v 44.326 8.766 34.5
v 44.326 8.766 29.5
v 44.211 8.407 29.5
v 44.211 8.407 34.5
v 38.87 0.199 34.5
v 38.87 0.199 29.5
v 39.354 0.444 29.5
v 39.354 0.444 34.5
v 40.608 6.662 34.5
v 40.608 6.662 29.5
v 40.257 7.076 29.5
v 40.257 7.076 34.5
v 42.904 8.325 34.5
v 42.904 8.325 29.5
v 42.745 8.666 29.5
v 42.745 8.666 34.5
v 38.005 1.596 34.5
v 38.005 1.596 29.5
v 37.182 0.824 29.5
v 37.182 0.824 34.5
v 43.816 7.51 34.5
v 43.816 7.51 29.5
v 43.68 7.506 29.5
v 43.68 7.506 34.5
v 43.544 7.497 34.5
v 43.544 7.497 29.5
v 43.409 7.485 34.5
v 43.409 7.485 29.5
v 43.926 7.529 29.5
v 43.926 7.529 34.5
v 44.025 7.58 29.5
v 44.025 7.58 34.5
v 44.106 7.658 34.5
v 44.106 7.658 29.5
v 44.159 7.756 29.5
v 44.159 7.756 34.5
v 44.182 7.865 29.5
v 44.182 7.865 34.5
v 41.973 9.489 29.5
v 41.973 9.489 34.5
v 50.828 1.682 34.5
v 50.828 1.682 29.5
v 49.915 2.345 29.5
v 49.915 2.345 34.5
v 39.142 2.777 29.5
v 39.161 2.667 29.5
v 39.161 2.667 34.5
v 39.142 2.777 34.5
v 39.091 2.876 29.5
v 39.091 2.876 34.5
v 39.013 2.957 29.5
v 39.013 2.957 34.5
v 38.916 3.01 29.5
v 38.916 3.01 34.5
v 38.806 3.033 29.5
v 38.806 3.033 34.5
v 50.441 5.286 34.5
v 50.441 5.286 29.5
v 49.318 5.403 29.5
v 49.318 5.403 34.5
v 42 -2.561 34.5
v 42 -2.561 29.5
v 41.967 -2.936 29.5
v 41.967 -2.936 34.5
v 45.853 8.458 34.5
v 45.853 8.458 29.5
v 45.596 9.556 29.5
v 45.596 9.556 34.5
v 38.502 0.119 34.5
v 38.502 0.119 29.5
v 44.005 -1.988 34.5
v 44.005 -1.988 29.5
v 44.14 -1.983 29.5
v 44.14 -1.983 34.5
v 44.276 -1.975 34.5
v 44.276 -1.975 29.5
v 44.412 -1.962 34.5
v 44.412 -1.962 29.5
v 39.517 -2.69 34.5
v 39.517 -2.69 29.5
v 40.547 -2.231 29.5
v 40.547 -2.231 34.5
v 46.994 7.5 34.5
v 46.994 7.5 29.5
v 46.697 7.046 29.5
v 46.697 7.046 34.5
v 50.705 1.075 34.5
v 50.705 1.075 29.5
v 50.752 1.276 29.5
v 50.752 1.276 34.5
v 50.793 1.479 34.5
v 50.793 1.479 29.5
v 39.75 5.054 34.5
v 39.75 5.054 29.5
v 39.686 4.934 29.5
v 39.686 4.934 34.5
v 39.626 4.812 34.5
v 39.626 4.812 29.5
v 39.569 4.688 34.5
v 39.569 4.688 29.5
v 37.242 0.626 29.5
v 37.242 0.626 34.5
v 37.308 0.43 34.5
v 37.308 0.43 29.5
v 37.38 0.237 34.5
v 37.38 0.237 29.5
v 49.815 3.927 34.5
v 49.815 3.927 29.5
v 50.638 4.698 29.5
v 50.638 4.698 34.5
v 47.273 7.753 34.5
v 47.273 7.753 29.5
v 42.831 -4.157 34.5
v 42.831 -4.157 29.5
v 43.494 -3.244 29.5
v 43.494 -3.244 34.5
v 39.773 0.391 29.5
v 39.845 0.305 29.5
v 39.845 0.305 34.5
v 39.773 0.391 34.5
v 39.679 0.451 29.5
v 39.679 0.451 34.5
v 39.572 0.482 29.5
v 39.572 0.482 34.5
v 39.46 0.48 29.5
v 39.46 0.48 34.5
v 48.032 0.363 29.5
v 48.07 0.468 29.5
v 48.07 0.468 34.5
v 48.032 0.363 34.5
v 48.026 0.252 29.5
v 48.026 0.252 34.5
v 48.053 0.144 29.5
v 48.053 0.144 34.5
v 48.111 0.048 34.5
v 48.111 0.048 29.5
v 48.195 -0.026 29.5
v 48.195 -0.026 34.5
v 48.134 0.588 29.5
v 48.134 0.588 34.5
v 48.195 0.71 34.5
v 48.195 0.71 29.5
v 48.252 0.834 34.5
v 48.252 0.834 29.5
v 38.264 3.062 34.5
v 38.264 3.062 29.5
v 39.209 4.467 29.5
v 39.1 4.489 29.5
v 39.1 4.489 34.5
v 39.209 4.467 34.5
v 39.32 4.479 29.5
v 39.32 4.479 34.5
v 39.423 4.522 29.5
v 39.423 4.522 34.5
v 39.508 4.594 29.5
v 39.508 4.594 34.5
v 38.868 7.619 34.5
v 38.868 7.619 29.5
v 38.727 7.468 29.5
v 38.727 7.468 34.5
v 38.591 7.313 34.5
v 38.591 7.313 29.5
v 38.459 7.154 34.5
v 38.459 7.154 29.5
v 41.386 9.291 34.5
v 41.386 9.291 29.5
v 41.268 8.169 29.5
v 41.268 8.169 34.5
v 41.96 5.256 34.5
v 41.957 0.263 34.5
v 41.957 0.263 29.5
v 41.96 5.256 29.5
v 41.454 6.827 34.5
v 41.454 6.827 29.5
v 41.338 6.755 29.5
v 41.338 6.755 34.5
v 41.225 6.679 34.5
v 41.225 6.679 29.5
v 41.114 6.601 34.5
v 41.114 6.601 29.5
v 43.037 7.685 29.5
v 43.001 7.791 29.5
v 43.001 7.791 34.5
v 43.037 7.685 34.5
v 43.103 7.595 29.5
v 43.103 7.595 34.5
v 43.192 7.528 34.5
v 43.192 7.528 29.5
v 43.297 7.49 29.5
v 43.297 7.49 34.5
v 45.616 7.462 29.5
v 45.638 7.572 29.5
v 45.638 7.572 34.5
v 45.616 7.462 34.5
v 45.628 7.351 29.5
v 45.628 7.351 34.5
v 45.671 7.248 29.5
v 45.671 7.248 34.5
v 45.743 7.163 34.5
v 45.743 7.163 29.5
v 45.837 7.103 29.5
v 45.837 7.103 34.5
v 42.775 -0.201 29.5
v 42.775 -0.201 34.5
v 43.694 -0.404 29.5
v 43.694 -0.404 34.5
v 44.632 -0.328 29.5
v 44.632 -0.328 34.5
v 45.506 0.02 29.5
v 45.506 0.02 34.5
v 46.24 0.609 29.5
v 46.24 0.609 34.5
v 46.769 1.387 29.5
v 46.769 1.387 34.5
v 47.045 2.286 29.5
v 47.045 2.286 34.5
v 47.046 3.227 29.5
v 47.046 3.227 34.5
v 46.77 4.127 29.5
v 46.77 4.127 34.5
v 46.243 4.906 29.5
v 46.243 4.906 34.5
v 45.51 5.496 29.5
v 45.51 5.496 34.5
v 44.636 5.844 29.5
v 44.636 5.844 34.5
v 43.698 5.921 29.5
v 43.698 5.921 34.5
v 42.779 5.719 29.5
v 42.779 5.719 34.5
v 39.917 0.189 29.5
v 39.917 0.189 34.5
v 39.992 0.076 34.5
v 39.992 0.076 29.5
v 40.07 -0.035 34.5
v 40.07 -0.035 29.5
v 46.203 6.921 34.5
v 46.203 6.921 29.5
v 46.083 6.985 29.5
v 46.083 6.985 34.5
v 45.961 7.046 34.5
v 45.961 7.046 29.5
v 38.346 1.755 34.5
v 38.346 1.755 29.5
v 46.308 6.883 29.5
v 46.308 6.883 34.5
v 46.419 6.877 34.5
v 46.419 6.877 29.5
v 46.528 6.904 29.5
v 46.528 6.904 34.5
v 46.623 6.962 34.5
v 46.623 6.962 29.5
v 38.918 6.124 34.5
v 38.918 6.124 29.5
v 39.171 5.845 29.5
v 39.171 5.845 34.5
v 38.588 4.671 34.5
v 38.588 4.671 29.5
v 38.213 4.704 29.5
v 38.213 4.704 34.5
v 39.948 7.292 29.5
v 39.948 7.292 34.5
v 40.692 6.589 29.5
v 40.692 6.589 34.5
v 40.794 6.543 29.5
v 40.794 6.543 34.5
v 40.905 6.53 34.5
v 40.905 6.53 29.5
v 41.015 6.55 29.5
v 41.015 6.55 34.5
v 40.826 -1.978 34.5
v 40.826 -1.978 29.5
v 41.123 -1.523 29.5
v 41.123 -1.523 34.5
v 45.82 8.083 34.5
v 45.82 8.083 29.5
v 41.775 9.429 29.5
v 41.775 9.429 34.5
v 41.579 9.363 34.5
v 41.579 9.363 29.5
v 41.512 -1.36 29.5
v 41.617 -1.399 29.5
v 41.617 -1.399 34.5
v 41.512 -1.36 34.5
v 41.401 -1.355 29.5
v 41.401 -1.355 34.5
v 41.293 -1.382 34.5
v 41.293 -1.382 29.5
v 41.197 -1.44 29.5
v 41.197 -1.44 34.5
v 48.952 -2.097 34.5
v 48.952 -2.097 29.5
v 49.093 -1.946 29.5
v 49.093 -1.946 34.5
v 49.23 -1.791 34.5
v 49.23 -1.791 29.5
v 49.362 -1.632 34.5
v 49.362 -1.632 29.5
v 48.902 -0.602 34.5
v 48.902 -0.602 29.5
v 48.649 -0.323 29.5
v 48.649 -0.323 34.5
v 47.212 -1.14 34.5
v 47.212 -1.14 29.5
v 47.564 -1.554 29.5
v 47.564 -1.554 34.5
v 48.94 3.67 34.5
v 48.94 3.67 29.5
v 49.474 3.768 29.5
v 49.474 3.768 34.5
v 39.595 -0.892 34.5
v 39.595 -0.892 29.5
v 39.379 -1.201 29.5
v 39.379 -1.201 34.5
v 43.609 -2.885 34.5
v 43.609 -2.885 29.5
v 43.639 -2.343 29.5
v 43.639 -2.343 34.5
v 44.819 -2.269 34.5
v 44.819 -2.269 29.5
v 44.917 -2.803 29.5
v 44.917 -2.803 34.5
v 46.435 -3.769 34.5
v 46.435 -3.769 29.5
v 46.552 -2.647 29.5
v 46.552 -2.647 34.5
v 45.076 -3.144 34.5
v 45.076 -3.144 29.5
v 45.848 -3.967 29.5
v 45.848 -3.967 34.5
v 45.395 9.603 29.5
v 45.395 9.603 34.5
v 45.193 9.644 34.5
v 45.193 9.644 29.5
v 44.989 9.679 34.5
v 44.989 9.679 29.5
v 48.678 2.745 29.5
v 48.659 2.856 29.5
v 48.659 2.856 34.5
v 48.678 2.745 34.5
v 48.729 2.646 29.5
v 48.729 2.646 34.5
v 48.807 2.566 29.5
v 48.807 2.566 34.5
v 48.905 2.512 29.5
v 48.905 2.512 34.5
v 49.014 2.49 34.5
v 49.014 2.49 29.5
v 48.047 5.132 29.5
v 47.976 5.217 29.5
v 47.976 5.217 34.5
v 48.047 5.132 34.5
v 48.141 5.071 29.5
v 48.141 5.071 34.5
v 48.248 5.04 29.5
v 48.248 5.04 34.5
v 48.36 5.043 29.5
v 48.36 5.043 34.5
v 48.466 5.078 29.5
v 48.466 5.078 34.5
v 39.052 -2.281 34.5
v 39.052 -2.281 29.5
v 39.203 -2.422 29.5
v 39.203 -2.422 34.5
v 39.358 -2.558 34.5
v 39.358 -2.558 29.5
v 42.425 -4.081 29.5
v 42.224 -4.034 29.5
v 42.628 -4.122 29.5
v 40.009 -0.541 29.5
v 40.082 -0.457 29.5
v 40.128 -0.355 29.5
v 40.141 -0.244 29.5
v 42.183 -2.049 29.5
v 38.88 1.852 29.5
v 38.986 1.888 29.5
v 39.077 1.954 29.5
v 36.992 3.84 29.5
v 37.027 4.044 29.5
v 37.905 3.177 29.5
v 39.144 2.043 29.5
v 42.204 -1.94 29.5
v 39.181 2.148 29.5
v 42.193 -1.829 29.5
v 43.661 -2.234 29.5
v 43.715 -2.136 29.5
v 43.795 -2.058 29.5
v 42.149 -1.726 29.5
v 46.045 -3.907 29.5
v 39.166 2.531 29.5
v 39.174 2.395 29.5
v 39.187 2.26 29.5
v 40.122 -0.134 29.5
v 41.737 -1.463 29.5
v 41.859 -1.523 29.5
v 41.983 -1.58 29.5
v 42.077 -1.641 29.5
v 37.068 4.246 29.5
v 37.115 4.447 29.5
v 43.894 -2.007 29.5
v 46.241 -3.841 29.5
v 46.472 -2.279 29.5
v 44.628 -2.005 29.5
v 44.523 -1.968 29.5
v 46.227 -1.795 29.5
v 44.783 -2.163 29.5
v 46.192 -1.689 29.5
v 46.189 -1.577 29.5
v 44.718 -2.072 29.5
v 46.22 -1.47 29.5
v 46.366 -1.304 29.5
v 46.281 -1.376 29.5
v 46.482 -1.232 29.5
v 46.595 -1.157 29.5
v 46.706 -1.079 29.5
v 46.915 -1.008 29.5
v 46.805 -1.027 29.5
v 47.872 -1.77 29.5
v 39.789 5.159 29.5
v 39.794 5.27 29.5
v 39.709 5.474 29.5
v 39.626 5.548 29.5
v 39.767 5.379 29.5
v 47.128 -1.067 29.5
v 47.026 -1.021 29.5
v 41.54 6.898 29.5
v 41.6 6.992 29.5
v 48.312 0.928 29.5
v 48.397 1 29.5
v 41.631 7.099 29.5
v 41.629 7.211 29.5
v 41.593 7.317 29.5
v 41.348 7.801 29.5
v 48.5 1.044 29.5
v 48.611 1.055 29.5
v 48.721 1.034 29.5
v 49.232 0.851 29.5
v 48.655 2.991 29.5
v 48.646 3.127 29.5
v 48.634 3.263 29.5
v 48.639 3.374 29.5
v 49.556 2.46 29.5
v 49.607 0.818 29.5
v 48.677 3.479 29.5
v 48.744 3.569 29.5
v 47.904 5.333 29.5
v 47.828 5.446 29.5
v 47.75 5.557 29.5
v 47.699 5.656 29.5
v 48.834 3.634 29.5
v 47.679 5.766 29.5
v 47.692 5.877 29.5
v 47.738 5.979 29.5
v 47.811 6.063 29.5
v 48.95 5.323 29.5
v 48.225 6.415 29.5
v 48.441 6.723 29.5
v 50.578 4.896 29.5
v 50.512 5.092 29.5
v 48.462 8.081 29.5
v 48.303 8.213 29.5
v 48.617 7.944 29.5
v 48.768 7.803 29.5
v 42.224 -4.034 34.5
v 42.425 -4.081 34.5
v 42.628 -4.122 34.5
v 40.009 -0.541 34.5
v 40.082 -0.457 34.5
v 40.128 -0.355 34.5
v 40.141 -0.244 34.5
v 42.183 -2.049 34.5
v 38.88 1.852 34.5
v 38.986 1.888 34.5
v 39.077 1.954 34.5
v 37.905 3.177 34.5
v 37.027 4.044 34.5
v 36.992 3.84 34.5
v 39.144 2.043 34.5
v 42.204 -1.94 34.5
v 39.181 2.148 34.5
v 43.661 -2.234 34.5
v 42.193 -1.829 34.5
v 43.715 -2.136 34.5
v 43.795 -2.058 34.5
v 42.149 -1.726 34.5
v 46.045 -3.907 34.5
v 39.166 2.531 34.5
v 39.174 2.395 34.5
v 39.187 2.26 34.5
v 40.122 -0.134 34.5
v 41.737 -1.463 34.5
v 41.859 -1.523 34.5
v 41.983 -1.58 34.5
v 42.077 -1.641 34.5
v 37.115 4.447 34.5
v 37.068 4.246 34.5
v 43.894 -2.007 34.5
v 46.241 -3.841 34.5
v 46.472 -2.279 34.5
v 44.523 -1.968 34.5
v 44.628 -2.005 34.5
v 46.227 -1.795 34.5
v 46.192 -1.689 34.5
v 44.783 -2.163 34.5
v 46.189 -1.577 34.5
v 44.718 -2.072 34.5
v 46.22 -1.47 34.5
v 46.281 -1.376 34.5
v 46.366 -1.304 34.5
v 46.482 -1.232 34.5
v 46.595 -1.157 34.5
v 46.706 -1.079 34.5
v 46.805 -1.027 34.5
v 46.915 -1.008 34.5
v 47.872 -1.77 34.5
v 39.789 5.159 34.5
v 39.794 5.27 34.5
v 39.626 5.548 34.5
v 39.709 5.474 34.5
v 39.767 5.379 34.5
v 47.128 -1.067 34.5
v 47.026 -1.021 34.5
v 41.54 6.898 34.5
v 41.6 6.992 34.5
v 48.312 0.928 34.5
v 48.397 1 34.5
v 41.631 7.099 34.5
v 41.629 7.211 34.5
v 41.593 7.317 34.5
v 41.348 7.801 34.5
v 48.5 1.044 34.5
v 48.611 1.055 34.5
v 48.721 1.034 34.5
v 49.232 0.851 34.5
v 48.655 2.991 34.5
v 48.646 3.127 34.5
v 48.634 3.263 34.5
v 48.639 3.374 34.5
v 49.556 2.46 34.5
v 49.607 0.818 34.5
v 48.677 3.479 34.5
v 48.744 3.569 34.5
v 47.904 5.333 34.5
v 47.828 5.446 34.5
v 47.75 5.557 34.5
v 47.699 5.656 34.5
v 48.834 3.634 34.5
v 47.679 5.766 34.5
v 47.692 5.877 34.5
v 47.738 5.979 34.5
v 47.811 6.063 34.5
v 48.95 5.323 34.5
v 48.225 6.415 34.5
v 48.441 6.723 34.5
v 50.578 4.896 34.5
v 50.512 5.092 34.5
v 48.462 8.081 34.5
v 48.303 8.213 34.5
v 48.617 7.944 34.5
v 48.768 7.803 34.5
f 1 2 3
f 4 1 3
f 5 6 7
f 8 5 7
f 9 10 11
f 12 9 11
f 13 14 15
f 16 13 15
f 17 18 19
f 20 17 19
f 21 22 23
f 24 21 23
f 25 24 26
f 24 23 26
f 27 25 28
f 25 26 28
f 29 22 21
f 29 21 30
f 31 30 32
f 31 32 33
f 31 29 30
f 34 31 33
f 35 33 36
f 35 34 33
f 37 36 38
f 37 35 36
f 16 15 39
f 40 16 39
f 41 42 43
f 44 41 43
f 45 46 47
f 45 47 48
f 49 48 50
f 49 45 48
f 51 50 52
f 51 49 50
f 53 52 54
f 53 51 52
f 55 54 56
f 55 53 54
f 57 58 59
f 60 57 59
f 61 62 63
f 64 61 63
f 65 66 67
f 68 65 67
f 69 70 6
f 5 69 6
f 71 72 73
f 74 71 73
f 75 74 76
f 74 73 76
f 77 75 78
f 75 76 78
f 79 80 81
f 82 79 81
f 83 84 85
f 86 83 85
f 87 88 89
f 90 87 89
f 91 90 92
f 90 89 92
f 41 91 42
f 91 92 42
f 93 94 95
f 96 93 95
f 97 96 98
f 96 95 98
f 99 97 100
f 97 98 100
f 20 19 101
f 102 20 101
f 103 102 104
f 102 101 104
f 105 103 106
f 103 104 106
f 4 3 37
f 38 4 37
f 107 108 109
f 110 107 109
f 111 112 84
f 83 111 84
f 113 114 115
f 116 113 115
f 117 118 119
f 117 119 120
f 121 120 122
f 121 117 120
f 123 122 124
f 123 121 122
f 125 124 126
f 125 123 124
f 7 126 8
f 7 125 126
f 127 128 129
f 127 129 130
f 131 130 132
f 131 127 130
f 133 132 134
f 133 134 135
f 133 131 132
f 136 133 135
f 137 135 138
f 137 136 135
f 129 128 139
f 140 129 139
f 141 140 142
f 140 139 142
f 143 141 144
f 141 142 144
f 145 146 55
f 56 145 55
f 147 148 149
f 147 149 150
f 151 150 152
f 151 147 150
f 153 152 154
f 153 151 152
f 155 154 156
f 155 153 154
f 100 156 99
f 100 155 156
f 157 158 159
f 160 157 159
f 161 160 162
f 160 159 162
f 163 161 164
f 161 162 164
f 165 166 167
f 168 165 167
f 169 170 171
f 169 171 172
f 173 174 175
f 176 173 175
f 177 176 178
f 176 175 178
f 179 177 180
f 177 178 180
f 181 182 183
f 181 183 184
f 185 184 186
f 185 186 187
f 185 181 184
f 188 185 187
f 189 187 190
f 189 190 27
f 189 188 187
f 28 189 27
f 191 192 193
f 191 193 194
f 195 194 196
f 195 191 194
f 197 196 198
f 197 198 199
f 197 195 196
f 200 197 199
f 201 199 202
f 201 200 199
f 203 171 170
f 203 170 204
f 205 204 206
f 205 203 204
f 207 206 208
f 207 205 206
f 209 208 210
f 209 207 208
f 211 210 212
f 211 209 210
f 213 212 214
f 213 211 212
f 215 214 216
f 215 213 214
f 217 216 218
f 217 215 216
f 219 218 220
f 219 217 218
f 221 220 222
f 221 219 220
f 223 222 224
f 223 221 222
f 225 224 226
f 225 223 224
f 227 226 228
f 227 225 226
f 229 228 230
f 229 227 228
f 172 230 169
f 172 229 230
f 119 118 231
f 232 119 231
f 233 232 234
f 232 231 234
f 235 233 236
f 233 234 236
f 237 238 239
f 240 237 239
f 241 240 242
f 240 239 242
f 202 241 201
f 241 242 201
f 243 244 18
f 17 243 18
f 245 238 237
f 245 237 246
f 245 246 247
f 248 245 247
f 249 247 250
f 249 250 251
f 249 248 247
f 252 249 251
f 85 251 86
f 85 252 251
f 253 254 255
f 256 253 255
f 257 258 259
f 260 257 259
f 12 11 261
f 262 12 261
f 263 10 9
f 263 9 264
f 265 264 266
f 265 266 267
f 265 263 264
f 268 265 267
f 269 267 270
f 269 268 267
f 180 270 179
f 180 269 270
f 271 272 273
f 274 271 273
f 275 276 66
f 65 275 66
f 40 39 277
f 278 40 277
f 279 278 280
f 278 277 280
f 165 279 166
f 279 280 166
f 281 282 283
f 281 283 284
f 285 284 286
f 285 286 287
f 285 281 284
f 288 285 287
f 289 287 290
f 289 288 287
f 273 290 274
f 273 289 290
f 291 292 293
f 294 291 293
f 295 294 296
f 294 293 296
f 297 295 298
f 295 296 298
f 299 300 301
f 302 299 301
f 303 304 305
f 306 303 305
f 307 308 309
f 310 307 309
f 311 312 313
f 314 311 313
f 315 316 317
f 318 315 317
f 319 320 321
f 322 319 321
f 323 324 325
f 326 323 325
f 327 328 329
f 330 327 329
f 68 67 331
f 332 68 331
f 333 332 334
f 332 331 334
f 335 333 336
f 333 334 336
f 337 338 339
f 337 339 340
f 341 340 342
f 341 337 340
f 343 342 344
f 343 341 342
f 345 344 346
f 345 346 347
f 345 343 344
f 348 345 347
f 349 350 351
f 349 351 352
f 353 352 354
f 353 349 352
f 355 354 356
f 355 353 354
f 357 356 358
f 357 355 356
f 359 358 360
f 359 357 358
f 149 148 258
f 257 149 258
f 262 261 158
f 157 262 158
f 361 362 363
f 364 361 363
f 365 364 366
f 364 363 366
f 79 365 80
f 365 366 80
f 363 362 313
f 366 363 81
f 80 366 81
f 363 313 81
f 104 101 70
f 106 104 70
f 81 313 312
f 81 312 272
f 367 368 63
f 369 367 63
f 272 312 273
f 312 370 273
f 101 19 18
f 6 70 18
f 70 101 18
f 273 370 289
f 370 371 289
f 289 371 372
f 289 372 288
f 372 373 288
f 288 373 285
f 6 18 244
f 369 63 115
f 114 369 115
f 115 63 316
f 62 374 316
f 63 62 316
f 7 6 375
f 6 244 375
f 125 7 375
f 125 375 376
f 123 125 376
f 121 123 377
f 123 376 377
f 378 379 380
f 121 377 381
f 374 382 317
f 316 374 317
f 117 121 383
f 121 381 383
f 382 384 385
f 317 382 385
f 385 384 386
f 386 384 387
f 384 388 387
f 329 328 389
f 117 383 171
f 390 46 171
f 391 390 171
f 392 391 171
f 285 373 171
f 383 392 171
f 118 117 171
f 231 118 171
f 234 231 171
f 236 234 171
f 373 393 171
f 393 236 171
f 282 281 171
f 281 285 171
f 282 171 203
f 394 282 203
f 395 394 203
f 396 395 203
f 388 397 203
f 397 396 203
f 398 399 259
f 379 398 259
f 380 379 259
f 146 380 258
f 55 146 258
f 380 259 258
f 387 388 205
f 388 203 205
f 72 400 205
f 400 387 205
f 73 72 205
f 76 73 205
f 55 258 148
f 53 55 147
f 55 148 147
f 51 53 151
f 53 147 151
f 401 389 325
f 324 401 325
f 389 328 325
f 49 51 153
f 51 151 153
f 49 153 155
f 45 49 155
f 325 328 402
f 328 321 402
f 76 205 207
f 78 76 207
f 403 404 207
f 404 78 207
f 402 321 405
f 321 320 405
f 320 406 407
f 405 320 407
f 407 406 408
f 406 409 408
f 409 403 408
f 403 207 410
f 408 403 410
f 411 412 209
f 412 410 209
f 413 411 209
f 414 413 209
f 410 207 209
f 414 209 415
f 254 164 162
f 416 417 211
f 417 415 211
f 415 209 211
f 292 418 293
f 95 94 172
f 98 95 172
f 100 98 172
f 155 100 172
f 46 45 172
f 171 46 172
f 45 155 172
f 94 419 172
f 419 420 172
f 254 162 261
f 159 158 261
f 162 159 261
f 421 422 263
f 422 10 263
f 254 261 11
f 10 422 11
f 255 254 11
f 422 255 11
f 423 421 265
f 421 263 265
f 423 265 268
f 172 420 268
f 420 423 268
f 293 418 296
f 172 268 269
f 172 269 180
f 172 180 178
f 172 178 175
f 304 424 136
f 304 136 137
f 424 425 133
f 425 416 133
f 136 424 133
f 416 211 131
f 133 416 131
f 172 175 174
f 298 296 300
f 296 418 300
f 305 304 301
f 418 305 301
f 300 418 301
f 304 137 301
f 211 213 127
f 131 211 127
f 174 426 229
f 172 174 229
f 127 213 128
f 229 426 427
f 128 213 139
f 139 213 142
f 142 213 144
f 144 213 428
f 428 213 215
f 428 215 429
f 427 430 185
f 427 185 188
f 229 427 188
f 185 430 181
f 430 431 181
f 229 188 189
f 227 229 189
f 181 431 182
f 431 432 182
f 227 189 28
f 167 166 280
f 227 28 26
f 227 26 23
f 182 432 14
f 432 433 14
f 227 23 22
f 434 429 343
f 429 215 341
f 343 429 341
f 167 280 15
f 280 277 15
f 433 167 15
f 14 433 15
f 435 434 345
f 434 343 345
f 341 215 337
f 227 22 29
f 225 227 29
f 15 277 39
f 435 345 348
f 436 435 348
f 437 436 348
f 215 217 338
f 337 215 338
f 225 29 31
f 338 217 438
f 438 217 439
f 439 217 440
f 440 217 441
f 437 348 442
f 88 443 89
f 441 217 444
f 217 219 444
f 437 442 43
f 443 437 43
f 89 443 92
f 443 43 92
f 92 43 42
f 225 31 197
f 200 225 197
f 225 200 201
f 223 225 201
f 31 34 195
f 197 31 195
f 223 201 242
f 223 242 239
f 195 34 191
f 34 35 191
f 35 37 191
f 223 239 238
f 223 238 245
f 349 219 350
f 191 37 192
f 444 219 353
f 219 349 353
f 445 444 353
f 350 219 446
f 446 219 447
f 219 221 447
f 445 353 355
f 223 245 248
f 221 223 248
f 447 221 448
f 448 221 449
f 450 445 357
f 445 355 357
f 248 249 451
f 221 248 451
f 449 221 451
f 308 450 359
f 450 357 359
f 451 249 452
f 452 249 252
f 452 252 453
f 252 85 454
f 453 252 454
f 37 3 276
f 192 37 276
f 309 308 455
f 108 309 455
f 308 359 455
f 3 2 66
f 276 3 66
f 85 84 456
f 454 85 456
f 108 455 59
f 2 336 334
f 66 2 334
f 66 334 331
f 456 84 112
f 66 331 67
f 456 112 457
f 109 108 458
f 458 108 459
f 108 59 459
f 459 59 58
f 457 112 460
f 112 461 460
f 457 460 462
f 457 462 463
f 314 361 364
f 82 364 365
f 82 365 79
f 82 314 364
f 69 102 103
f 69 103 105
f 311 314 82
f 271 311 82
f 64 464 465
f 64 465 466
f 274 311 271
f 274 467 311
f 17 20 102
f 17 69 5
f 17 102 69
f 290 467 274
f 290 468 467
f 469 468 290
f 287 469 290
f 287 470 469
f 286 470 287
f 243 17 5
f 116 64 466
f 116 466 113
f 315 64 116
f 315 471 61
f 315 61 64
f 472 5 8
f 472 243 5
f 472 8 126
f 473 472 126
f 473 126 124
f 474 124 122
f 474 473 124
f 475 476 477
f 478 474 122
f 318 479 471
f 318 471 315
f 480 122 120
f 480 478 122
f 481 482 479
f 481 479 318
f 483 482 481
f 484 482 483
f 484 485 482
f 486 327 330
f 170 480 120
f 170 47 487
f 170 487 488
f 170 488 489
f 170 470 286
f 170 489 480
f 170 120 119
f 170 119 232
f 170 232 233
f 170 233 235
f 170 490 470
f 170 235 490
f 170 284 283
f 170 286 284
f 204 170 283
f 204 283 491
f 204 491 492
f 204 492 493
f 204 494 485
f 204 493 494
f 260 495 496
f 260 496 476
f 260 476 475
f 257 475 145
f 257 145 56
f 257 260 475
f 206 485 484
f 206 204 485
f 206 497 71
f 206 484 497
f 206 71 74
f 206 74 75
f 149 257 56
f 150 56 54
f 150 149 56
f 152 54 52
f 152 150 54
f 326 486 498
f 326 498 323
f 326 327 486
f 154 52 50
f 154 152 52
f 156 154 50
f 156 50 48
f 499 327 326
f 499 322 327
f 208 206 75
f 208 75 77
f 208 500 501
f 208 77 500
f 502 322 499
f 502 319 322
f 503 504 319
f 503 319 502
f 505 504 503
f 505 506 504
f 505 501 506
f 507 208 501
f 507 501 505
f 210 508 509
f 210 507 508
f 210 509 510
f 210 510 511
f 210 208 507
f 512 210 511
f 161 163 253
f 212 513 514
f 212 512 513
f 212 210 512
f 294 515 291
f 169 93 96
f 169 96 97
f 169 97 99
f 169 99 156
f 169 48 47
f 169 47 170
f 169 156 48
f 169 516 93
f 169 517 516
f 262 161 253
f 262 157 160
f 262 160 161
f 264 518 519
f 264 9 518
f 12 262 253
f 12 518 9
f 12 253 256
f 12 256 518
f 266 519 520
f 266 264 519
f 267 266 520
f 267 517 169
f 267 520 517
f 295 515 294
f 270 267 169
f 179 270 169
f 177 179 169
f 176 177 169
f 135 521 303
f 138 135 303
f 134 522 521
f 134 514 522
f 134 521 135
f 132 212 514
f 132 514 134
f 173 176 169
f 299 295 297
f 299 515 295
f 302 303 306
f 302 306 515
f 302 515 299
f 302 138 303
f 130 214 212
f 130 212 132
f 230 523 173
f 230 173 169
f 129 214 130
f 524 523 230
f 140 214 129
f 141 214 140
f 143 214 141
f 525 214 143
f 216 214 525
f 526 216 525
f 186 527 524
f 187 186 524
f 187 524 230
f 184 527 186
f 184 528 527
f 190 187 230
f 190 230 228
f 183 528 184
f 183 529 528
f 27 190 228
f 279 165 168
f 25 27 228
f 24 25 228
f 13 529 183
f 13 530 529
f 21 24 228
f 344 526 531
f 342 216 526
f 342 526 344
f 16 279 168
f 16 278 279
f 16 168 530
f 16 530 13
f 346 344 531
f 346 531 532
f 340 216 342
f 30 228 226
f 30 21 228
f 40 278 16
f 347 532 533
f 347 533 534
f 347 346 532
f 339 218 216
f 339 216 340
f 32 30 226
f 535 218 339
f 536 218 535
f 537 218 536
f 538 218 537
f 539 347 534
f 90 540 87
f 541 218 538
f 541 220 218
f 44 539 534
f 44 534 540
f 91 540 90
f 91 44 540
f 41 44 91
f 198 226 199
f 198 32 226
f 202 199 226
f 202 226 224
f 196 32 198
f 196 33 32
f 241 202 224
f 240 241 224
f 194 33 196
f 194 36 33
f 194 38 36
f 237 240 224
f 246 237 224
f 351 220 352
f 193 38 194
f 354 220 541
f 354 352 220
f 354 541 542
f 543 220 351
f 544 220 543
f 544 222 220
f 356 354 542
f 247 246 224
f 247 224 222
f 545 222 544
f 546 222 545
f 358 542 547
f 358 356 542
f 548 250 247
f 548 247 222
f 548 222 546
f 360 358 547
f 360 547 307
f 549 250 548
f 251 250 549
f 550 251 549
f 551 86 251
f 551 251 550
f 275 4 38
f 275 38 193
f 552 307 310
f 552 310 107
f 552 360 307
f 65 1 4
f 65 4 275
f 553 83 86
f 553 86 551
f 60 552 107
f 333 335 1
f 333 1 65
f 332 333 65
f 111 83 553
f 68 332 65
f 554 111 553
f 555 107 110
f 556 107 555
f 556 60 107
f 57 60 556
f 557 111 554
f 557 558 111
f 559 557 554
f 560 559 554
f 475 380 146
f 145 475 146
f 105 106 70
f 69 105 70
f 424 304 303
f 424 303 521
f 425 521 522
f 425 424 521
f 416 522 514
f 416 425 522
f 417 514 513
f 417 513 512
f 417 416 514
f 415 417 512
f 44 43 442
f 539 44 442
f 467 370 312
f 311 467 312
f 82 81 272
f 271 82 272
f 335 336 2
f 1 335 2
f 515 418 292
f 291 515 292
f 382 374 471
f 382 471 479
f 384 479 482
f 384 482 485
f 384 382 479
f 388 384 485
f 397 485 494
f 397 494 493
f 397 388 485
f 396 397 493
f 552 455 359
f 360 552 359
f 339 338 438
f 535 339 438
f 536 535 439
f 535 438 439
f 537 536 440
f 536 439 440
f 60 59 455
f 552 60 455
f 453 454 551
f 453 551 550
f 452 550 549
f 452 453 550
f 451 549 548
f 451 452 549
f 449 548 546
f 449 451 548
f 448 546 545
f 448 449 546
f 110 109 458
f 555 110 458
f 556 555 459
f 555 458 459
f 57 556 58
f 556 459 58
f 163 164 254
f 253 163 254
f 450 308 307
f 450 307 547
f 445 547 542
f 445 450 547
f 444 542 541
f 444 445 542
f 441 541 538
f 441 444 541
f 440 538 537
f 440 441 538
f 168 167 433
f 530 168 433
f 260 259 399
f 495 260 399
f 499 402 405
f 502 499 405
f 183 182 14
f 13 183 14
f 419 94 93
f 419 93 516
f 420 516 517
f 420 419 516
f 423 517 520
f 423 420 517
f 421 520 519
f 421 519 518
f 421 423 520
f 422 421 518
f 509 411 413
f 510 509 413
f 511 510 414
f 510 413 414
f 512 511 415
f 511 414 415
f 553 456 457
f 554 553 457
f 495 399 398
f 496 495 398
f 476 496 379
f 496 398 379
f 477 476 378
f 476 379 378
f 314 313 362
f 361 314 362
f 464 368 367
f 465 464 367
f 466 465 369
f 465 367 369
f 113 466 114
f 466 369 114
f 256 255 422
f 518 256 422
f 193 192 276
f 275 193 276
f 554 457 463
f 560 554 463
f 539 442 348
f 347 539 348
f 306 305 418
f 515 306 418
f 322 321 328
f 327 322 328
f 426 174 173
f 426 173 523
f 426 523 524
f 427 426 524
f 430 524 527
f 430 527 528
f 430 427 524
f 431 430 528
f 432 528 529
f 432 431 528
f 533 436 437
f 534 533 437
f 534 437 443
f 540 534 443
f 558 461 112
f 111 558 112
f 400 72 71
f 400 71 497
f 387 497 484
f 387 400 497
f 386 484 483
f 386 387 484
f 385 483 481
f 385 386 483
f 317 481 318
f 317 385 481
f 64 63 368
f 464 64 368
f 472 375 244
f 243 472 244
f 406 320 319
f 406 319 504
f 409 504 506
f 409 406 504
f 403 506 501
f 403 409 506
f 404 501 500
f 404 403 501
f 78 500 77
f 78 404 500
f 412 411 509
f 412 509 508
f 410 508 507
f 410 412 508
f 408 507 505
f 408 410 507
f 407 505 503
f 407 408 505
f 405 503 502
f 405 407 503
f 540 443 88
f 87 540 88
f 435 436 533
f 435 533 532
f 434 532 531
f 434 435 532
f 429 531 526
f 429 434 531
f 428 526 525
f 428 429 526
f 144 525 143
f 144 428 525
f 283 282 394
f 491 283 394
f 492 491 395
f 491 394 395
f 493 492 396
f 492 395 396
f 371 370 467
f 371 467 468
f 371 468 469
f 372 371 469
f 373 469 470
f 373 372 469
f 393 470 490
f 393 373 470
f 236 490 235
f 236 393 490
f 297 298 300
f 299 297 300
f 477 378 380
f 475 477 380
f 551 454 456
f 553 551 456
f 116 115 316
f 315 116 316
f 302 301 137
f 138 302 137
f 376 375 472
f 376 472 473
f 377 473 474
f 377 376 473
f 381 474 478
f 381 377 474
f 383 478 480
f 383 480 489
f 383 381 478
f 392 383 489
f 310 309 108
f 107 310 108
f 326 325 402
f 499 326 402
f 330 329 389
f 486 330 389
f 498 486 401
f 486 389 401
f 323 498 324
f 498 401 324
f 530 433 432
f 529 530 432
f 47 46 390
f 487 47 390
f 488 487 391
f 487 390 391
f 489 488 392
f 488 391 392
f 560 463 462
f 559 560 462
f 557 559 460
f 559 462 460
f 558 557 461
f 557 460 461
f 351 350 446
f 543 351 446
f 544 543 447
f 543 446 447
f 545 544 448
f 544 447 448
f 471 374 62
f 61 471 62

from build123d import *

# Parameters (mm, degrees)
PAD015_DEPTH = 12
PAD014_DEPTH = 5


with BuildPart() as body013:
    # Sketch146 → Pad015 (new body)
    with BuildSketch(Plane.XY):
        with BuildLine():
            Line((41.956765, 0.26313), (41.959666, 5.256243))
            ThreePointArc((41.956765, 0.26313), (47.080742, 2.75671), (41.959666, 5.256243))
        make_face()
    extrude(amount=PAD015_DEPTH)


with BuildPart() as body013_1:
    # Body013 placement: moved
    add(body013.part.moved(Location((0, 0, 4))))


with BuildPart() as old_pinion:
    # Sketch145 → Pad014 (new body)
    with BuildSketch(Plane.XY):
        with BuildLine():
            Line((48.939875, 3.670275), (49.473913, 3.767638))
            Line((49.473913, 3.767638), (49.815259, 3.926647))
            Line((49.815259, 3.926647), (50.638101, 4.698494))
            ThreePointArc((50.638101, 4.698494), (50.5458, 4.994259), (50.440501, 5.285649))
            Line((50.440501, 5.285649), (49.318425, 5.40296))
            Line((49.318425, 5.40296), (48.950396, 5.323237))
            Line((48.950396, 5.323237), (48.466153, 5.077911))
            ThreePointArc((47.975725, 5.217399), (48.193585, 5.05148), (48.466153, 5.077911))
            ThreePointArc((47.975725, 5.217399), (47.866498, 5.389716), (47.749972, 5.557185))
            ThreePointArc((47.811432, 6.063346), (47.681442, 5.822318), (47.749972, 5.557185))
            Line((47.811432, 6.063346), (48.225241, 6.414684))
            Line((48.225241, 6.414684), (48.441351, 6.723062))
            Line((48.441351, 6.723062), (48.768029, 7.802923))
            ThreePointArc((48.768029, 7.802923), (48.540212, 8.012912), (48.303325, 8.212614))
            Line((48.303325, 8.212614), (47.272923, 7.75317))
            Line((47.272923, 7.75317), (46.994062, 7.500114))
            Line((46.994062, 7.500114), (46.697359, 7.045533))
            ThreePointArc((46.202892, 6.92112), (46.474523, 6.886359), (46.697359, 7.045533))
            ThreePointArc((46.202892, 6.92112), (46.022139, 7.015737), (45.837491, 7.102506))
            ThreePointArc((45.637635, 7.571584), (45.645575, 7.297853), (45.837491, 7.102506))
            Line((45.637635, 7.571584), (45.820336, 8.082756))
            Line((45.820336, 8.082756), (45.853303, 8.457875))
            Line((45.853303, 8.457875), (45.596285, 9.556401))
            ThreePointArc((45.596285, 9.556401), (45.293995, 9.624348), (44.988994, 9.678852))
            Line((44.988994, 9.678852), (44.326362, 8.765761))
            Line((44.326362, 8.765761), (44.211389, 8.407177))
            Line((44.211389, 8.407177), (44.181727, 7.865147))
            ThreePointArc((43.815712, 7.510168), (44.068332, 7.615881), (44.181727, 7.865147))
            ThreePointArc((43.815712, 7.510168), (43.611867, 7.501733), (43.408573, 7.484553))
            ThreePointArc((43.000954, 7.790859), (43.144695, 7.55777), (43.408573, 7.484553))
            Line((43.000954, 7.790859), (42.903591, 8.324897))
            Line((42.903591, 8.324897), (42.744582, 8.666243))
            Line((42.744582, 8.666243), (41.972735, 9.489085))
            ThreePointArc((41.972735, 9.489085), (41.67697, 9.396784), (41.38558, 9.291486))
            Line((41.38558, 9.291486), (41.268269, 8.169409))
            Line((41.268269, 8.169409), (41.347991, 7.80138))
            Line((41.347991, 7.80138), (41.593318, 7.317138))
            ThreePointArc((41.45383, 6.82671), (41.619749, 7.044569), (41.593318, 7.317138))
            ThreePointArc((41.45383, 6.82671), (41.281512, 6.717482), (41.114044, 6.600956))
            ThreePointArc((40.607883, 6.662416), (40.848911, 6.532426), (41.114044, 6.600956))
            Line((40.607883, 6.662416), (40.256545, 7.076225))
            Line((40.256545, 7.076225), (39.948167, 7.292335))
            Line((39.948167, 7.292335), (38.868306, 7.619013))
            ThreePointArc((38.868306, 7.619013), (38.658317, 7.391196), (38.458615, 7.154309))
            Line((38.458615, 7.154309), (38.918059, 6.123907))
            Line((38.918059, 6.123907), (39.171115, 5.845046))
            Line((39.171115, 5.845046), (39.625696, 5.548343))
            ThreePointArc((39.750109, 5.053876), (39.784869, 5.325508), (39.625696, 5.548343))
            ThreePointArc((39.750109, 5.053876), (39.655491, 4.873124), (39.568723, 4.688475))
            ThreePointArc((39.099644, 4.48862), (39.373376, 4.496559), (39.568723, 4.688475))
            Line((39.099644, 4.48862), (38.588472, 4.67132))
            Line((38.588472, 4.67132), (38.213354, 4.704288))
            Line((38.213354, 4.704288), (37.114828, 4.447269))
            ThreePointArc((37.114828, 4.447269), (37.046881, 4.144979), (36.992377, 3.839978))
            Line((36.992377, 3.839978), (37.905468, 3.177346))
            Line((37.905468, 3.177346), (38.264052, 3.062373))
            Line((38.264052, 3.062373), (38.806082, 3.032711))
            ThreePointArc((39.161061, 2.666696), (39.055348, 2.919317), (38.806082, 3.032711))
            ThreePointArc((39.161061, 2.666696), (39.169495, 2.462852), (39.186676, 2.259557))
            ThreePointArc((38.88037, 1.851938), (39.113458, 1.99568), (39.186676, 2.259557))
            Line((38.88037, 1.851938), (38.346331, 1.754575))
            Line((38.346331, 1.754575), (38.004985, 1.595567))
            Line((38.004985, 1.595567), (37.182144, 0.823719))
            ThreePointArc((37.182144, 0.823719), (37.274445, 0.527954), (37.379743, 0.236564))
            Line((37.379743, 0.236564), (38.50182, 0.119253))
            Line((38.50182, 0.119253), (38.869848, 0.198976))
            Line((38.869848, 0.198976), (39.354091, 0.444302))
            ThreePointArc((39.844519, 0.304814), (39.626659, 0.470733), (39.354091, 0.444302))
            ThreePointArc((39.844519, 0.304814), (39.953746, 0.132497), (40.070272, -0.034972))
            ThreePointArc((40.008813, -0.541133), (40.138803, -0.300105), (40.070272, -0.034972))
            Line((40.008813, -0.541133), (39.595004, -0.892471))
            Line((39.595004, -0.892471), (39.378894, -1.200849))
            Line((39.378894, -1.200849), (39.052216, -2.28071))
            ThreePointArc((39.052216, -2.28071), (39.280033, -2.490699), (39.516919, -2.690401))
            Line((39.516919, -2.690401), (40.547321, -2.230957))
            Line((40.547321, -2.230957), (40.826183, -1.977901))
            Line((40.826183, -1.977901), (41.122886, -1.52332))
            ThreePointArc((41.617353, -1.398907), (41.345721, -1.364146), (41.122886, -1.52332))
            ThreePointArc((41.617353, -1.398907), (41.798105, -1.493524), (41.982754, -1.580293))
            ThreePointArc((42.182609, -2.049371), (42.17467, -1.77564), (41.982754, -1.580293))
            Line((42.182609, -2.049371), (41.999908, -2.560543))
            Line((41.999908, -2.560543), (41.966941, -2.935662))
            Line((41.966941, -2.935662), (42.22396, -4.034188))
            ThreePointArc((42.22396, -4.034188), (42.52625, -4.102135), (42.831251, -4.156639))
            Line((42.831251, -4.156639), (43.493883, -3.243547))
            Line((43.493883, -3.243547), (43.608856, -2.884964))
            Line((43.608856, -2.884964), (43.638518, -2.342934))
            ThreePointArc((44.004532, -1.987955), (43.751912, -2.093668), (43.638518, -2.342934))
            ThreePointArc((44.004532, -1.987955), (44.208377, -1.97952), (44.411672, -1.96234))
            ThreePointArc((44.819291, -2.268646), (44.675549, -2.035557), (44.411672, -1.96234))
            Line((44.819291, -2.268646), (44.916653, -2.802684))
            Line((44.916653, -2.802684), (45.075662, -3.14403))
            Line((45.075662, -3.14403), (45.84751, -3.966872))
            ThreePointArc((45.84751, -3.966872), (46.143275, -3.874571), (46.434665, -3.769273))
            Line((46.434665, -3.769273), (46.551975, -2.647196))
            Line((46.551975, -2.647196), (46.472253, -2.279167))
            Line((46.472253, -2.279167), (46.226926, -1.794925))
            ThreePointArc((46.366415, -1.304496), (46.200495, -1.522356), (46.226926, -1.794925))
            ThreePointArc((46.366415, -1.304496), (46.538732, -1.195269), (46.7062, -1.078743))
            ThreePointArc((47.212362, -1.140203), (46.971333, -1.010213), (46.7062, -1.078743))
            Line((47.212362, -1.140203), (47.563699, -1.554012))
            Line((47.563699, -1.554012), (47.872078, -1.770122))
            Line((47.872078, -1.770122), (48.951939, -2.0968))
            ThreePointArc((48.951939, -2.0968), (49.161928, -1.868983), (49.36163, -1.632096))
            Line((49.36163, -1.632096), (48.902185, -0.601694))
            Line((48.902185, -0.601694), (48.649129, -0.322833))
            Line((48.649129, -0.322833), (48.194549, -0.02613))
            ThreePointArc((48.070135, 0.468337), (48.035375, 0.196706), (48.194549, -0.02613))
            ThreePointArc((48.070135, 0.468337), (48.164753, 0.649089), (48.251522, 0.833738))
            ThreePointArc((48.7206, 1.033593), (48.446869, 1.025654), (48.251522, 0.833738))
            Line((48.7206, 1.033593), (49.231772, 0.850893))
            Line((49.231772, 0.850893), (49.606891, 0.817925))
            Line((49.606891, 0.817925), (50.705417, 1.074944))
            ThreePointArc((50.705417, 1.074944), (50.773364, 1.377234), (50.827868, 1.682235))
            Line((50.827868, 1.682235), (49.914776, 2.344867))
            Line((49.914776, 2.344867), (49.556193, 2.45984))
            Line((49.556193, 2.45984), (49.014163, 2.489502))
            ThreePointArc((48.659184, 2.855517), (48.764896, 2.602897), (49.014163, 2.489502))
            ThreePointArc((48.659184, 2.855517), (48.650749, 3.059361), (48.633569, 3.262656))
            ThreePointArc((48.939875, 3.670275), (48.706786, 3.526534), (48.633569, 3.262656))
        make_face()
    extrude(amount=PAD014_DEPTH)


with BuildPart() as old_pinion_1:
    # Body012 placement: moved
    add(old_pinion.part.moved(Location((0, 0, 4))))

    # Cut001: cut Body013
    add(body013_1.part, mode=Mode.SUBTRACT)


with BuildPart() as old_pinion_2:
    # Cut001 placement: moved
    add(old_pinion_1.part.moved(Location((0, 0, 25.5))))


solid = old_pinion_2.part
